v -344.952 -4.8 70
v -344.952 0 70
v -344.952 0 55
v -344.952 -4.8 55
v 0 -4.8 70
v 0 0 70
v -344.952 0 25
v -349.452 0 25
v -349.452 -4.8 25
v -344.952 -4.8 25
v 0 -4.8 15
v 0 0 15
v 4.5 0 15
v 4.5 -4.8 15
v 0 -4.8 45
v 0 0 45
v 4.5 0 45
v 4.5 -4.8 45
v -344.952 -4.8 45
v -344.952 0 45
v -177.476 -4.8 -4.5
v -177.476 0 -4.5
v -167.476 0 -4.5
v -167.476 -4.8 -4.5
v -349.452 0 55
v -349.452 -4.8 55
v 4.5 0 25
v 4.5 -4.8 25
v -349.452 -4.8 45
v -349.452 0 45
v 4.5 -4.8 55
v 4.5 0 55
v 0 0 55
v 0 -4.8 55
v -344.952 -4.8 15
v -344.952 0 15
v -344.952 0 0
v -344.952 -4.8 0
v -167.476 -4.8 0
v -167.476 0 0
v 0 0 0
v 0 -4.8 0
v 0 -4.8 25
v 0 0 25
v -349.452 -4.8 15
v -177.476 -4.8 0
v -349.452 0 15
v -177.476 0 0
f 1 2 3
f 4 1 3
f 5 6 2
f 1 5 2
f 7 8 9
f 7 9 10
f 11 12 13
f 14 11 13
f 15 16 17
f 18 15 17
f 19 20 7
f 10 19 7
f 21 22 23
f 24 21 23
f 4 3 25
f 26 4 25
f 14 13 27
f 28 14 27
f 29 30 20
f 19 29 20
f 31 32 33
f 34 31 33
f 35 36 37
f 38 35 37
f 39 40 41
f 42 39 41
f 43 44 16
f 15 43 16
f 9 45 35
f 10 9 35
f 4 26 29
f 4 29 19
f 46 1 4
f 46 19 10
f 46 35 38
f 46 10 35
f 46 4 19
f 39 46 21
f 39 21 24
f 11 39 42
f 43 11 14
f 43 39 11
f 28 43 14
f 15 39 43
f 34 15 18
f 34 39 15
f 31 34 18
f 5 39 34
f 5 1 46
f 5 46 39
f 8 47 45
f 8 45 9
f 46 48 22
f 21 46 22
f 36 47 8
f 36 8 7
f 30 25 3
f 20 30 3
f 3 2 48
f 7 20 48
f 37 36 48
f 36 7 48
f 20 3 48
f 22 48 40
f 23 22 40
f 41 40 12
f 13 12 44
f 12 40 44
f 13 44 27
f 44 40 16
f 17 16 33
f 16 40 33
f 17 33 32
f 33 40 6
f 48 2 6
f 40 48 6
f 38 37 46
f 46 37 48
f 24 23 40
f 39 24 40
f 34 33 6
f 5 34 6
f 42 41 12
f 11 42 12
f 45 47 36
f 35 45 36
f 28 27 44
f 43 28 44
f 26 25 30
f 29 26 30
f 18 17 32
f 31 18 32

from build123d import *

# Parameters (mm, degrees)
F0_W     = 4.5
F0_H     = 10
F1_DEPTH = 4.8


# Not quite as in the source:
# - a feature names something its author has since deleted; it is built from what else it names


with BuildPart() as f1:
    # F0 (on Front) → F1 (new body)
    with BuildSketch(Plane.XZ):
        Polygon((-167.476225, 0), (0, 0), (0, 15), (4.5, 15), (4.5, 25), (0, 25), (0, 45), (4.5, 45), (4.5, 55), (0, 55), (0, 70), (-172.276225, 70), (-182.276225, 70), (-344.95245, 70), (-344.95245, 55), (-349.45245, 55), (-349.45245, 45), (-344.95245, 45), (-344.95245, 25), (-344.95245, 15), (-344.95245, 0), (-177.476225, 0), align=None)
        Polygon((-167.476225, -0.2312080078), (-167.476225, 0), (-177.476225, 0), (-177.476225, -4.5), (-167.476225, -4.5), align=None)
        with Locations((-347.20245, 20)):
            Rectangle(F0_W, F0_H)
    extrude(amount=F1_DEPTH)


solid = f1.part
